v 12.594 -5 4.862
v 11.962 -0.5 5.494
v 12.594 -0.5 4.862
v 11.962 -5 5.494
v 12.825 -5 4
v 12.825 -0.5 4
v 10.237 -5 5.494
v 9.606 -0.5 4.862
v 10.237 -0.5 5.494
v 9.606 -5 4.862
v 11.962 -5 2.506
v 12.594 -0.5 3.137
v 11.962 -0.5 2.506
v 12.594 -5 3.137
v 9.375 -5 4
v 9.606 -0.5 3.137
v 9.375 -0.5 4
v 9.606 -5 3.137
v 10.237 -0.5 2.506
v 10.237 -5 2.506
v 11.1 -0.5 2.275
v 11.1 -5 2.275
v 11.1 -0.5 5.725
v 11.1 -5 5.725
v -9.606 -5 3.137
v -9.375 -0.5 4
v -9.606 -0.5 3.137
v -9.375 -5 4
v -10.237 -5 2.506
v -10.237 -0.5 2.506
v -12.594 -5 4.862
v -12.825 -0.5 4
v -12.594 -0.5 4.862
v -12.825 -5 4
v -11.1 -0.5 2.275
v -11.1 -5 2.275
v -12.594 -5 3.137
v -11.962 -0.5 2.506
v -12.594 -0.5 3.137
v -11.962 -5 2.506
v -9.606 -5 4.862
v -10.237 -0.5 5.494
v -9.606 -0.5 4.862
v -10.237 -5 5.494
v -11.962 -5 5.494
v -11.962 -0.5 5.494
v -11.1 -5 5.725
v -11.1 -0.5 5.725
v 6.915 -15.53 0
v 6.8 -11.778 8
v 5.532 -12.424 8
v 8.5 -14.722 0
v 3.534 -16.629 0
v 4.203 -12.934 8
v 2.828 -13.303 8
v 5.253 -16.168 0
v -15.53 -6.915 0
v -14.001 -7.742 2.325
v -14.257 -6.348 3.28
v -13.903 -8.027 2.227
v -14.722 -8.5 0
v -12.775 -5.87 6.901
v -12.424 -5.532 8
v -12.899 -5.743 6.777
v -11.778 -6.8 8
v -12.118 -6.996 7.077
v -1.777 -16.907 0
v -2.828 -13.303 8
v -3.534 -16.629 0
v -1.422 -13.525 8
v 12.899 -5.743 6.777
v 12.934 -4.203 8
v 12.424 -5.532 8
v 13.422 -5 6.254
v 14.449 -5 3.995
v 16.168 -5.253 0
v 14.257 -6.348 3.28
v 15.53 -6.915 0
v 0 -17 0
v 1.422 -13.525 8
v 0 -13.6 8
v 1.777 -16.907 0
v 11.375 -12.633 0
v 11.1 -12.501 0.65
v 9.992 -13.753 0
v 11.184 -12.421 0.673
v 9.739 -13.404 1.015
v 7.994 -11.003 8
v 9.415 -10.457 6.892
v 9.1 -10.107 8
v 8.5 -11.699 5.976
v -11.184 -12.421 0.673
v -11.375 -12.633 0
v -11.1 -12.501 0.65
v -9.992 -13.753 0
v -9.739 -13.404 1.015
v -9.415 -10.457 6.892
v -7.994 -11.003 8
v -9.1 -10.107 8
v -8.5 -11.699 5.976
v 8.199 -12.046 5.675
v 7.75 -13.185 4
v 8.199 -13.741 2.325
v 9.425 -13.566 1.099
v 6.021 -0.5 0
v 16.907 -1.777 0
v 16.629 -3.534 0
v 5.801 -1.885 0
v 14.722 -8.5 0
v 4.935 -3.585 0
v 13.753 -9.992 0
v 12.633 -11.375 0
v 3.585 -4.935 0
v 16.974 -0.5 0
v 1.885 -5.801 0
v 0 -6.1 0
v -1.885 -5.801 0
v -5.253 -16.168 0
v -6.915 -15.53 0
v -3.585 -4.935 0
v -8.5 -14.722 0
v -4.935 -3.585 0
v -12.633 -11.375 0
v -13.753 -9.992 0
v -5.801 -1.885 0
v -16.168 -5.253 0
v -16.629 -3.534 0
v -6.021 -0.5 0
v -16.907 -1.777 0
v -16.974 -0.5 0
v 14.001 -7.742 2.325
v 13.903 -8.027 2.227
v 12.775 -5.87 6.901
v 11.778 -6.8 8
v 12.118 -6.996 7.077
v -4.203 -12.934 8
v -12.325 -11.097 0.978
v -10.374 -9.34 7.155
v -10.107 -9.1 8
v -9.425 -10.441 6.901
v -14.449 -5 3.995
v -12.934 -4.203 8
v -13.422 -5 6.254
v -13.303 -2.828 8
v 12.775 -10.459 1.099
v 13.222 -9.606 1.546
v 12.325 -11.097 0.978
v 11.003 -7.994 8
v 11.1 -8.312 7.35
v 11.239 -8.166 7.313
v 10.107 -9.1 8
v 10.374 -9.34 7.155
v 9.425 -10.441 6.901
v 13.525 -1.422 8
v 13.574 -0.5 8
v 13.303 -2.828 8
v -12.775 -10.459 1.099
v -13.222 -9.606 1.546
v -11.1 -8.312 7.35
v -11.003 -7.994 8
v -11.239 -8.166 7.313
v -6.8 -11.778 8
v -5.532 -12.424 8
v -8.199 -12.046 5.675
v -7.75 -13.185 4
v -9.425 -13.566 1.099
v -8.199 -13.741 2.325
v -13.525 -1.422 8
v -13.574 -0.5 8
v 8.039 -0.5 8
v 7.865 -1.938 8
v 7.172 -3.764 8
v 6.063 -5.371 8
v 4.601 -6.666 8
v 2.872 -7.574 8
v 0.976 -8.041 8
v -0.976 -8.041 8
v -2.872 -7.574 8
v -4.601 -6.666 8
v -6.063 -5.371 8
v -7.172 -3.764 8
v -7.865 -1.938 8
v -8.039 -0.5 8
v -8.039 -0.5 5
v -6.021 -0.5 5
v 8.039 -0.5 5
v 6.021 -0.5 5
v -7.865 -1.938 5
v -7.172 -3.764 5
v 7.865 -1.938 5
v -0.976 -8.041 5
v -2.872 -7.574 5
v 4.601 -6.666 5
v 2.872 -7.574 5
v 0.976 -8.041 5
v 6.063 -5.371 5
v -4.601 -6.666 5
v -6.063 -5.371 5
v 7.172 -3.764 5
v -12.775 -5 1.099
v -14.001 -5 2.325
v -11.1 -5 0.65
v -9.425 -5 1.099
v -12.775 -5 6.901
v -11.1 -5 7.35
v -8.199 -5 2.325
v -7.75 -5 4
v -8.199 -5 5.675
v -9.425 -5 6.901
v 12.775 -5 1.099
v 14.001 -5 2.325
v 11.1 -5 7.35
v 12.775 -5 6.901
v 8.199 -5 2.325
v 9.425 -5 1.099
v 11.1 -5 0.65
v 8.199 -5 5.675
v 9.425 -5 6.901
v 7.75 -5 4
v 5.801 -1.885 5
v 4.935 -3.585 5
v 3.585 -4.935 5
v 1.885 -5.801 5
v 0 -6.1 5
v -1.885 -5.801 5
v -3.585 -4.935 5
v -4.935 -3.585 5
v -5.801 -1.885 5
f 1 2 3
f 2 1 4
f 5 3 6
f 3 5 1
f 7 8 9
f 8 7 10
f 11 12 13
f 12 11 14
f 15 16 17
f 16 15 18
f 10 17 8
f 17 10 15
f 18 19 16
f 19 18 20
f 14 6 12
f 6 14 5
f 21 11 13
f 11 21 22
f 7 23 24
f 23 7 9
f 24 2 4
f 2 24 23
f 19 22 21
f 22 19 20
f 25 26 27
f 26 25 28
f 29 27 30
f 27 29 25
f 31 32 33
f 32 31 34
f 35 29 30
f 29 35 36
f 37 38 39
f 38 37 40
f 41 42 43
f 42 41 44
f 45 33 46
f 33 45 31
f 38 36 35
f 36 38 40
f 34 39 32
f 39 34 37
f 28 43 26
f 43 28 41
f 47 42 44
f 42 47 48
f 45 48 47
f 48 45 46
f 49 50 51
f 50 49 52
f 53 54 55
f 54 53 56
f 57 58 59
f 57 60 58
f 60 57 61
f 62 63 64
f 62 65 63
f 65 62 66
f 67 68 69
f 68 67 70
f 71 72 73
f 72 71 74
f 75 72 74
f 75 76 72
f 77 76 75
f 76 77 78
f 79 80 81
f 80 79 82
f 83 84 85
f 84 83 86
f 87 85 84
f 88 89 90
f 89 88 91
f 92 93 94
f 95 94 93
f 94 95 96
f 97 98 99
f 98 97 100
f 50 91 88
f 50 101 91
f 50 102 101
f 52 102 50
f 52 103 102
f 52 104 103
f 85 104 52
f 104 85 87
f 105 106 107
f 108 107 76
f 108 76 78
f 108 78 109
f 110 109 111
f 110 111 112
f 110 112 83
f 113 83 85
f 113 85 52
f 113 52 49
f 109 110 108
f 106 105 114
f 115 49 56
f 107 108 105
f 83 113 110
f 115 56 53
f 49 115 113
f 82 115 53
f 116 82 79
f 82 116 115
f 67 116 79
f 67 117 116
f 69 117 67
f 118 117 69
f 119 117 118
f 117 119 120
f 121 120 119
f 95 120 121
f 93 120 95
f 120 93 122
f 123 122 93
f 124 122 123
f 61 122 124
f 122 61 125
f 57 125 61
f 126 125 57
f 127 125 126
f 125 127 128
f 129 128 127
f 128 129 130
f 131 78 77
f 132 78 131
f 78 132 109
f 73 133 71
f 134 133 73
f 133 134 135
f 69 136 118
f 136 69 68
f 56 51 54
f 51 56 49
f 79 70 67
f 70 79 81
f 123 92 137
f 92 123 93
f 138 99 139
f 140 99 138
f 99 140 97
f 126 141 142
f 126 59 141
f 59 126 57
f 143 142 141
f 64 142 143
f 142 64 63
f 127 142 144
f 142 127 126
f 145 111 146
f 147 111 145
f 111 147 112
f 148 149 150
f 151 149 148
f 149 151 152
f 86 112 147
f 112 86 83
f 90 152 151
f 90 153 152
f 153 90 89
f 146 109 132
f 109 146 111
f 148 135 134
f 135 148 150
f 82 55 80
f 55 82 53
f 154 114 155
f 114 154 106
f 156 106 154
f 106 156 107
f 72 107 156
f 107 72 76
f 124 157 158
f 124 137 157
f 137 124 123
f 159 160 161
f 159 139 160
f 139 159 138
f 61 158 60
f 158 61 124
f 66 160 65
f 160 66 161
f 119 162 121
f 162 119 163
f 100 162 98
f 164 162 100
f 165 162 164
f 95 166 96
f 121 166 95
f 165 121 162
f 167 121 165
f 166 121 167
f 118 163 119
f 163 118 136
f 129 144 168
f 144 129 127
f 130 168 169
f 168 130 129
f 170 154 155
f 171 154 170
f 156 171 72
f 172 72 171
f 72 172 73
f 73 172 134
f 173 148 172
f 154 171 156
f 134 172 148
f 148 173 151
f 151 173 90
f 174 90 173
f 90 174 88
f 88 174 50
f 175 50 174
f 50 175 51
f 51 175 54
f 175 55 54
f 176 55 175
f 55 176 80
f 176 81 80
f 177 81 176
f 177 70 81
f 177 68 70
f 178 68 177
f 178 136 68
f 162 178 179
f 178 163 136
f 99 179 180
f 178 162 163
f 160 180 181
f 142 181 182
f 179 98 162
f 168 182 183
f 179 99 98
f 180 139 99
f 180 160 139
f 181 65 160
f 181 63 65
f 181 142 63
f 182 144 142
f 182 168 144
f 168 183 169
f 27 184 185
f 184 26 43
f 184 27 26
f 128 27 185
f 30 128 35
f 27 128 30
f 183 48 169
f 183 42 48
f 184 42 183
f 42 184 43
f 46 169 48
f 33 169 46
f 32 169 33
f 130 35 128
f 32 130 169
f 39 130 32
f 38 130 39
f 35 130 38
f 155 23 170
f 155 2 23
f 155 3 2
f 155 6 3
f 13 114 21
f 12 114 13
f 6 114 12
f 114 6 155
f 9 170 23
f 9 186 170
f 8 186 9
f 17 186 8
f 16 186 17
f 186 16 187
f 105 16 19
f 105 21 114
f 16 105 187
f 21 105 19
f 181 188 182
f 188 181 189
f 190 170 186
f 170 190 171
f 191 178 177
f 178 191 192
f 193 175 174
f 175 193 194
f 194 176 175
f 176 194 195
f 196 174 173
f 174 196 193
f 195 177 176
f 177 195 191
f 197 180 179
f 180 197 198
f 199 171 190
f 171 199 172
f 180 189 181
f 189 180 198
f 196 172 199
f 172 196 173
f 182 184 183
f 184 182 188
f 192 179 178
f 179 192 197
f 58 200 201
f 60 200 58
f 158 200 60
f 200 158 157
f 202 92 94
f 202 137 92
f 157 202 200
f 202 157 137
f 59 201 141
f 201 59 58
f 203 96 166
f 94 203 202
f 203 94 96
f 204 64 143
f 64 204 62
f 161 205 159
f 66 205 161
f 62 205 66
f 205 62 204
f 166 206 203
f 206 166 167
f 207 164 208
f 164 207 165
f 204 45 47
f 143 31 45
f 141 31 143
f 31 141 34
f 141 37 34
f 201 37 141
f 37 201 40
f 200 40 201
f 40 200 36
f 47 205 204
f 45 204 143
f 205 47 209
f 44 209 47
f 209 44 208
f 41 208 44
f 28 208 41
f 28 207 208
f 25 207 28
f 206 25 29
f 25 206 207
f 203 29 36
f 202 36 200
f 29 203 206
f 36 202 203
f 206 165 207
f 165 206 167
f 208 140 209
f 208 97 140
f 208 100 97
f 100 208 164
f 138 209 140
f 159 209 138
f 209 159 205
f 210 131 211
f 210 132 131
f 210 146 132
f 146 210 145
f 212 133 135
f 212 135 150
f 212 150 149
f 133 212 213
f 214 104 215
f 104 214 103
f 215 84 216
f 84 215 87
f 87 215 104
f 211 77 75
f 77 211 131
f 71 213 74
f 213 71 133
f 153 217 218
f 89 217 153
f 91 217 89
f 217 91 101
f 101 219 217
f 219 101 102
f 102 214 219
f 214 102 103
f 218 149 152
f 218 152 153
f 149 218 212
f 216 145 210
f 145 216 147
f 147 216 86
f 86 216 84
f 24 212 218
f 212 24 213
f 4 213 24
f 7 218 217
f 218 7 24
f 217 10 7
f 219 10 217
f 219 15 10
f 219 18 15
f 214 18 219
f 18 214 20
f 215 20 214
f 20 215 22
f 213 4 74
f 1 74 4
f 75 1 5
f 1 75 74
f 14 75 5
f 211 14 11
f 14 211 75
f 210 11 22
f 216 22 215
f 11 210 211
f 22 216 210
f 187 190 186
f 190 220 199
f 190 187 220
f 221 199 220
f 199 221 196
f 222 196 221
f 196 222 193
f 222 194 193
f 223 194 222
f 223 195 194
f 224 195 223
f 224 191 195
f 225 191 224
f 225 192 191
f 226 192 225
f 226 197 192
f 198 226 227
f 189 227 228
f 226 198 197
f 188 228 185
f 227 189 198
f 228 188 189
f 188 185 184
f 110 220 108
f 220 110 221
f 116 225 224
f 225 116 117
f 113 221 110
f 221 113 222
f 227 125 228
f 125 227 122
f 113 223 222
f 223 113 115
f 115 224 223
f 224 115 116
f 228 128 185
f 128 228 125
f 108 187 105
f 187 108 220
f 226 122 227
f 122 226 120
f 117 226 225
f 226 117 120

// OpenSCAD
// file: configuration.scad
// Increase this if your slicer or printer make holes too tight.
extra_radius = 0.1;

// OD = outside diameter, corner to corner.
m3_nut_od = 6.1;
m3_nut_radius = m3_nut_od/2 + 0.2 + extra_radius;
m3_washer_radius = 3.5 + extra_radius;

// Major diameter of metric 3mm thread.
m3_major = 2.85;
m3_radius = m3_major/2 + extra_radius;
m3_wide_radius = m3_major/2 + extra_radius + 0.2;

// NEMA17 stepper motors.
motor_shaft_diameter = 5;
motor_shaft_radius = motor_shaft_diameter/2 + extra_radius;

// Frame brackets. M3x8mm screws work best with 3.6 mm brackets.
thickness = 3.6;

// OpenBeam or Misumi. Currently only 15x15 mm, but there is a plan
// to make models more parametric and allow 20x20 mm in the future.
extrusion = 15;

// Placement for the NEMA17 stepper motors.
motor_offset = 44;
motor_length = 47;
// main file
include <configuration.scad>


separation = 40;  // Distance between ball joint mounting faces.
offset = 20;  // Same as DELTA_EFFECTOR_OFFSET in Marlin.
hotend_radius = 8.1;  // Hole for the hotend (J-Head diameter is 16mm).
height = 8;


//Top
difference()
{
cylinder(40,offset-3,0, $fn=60);
translate([0,0,height]) cylinder(20,20,20);             //Cut off the top
translate([-20,-0.5,0]) cube ([40,20,10]);                //split in half. Moved -.5 to add .5mm distance
cylinder(40,hotend_radius,hotend_radius);					//Center for hotend
translate([-hotend_radius-3,-10,height/2]) rotate([0, 90, 90]) cylinder(r=m3_nut_radius, h=10, center=true, $fn=12);		//M3 Screw nuts ([-hotend_radius-4,-10,height/2]) -4 is distance to inner wall
translate([hotend_radius+3,-10,height/2]) rotate([0, 90, 90]) cylinder(r=m3_nut_radius, h=10, center=true, $fn=12);		//M3 Screw nuts //M3 Screw nuts ([-hotend_radius-4,-10,height/2]) -4 is distance to inner wall
for (a = [0:180:359]) rotate([0, 0, a]) {		//M3 screw hole
      translate([hotend_radius+3, 0, 4])		//M3 Screw nuts ([hotend_radius+4, 0, 4]) -4 is distance to center & 4 is distance to bottom
		rotate([90, 0, 0]) 
		cylinder(r=m3_wide_radius, h=50, center=true, $fn=12);
    }
}


//Lipp
difference()
{
translate([0,0,0])cylinder(5,hotend_radius,hotend_radius);	//5 so it lays flatt.  
translate([-20,-0.5,0]) cube ([40,20,10]);                //split in half. Moved -.5 to add .5mm distance
translate([0,0,-1])cylinder(10,hotend_radius-2,hotend_radius-2); //cut out center, -2 = 2mm lipp
}
